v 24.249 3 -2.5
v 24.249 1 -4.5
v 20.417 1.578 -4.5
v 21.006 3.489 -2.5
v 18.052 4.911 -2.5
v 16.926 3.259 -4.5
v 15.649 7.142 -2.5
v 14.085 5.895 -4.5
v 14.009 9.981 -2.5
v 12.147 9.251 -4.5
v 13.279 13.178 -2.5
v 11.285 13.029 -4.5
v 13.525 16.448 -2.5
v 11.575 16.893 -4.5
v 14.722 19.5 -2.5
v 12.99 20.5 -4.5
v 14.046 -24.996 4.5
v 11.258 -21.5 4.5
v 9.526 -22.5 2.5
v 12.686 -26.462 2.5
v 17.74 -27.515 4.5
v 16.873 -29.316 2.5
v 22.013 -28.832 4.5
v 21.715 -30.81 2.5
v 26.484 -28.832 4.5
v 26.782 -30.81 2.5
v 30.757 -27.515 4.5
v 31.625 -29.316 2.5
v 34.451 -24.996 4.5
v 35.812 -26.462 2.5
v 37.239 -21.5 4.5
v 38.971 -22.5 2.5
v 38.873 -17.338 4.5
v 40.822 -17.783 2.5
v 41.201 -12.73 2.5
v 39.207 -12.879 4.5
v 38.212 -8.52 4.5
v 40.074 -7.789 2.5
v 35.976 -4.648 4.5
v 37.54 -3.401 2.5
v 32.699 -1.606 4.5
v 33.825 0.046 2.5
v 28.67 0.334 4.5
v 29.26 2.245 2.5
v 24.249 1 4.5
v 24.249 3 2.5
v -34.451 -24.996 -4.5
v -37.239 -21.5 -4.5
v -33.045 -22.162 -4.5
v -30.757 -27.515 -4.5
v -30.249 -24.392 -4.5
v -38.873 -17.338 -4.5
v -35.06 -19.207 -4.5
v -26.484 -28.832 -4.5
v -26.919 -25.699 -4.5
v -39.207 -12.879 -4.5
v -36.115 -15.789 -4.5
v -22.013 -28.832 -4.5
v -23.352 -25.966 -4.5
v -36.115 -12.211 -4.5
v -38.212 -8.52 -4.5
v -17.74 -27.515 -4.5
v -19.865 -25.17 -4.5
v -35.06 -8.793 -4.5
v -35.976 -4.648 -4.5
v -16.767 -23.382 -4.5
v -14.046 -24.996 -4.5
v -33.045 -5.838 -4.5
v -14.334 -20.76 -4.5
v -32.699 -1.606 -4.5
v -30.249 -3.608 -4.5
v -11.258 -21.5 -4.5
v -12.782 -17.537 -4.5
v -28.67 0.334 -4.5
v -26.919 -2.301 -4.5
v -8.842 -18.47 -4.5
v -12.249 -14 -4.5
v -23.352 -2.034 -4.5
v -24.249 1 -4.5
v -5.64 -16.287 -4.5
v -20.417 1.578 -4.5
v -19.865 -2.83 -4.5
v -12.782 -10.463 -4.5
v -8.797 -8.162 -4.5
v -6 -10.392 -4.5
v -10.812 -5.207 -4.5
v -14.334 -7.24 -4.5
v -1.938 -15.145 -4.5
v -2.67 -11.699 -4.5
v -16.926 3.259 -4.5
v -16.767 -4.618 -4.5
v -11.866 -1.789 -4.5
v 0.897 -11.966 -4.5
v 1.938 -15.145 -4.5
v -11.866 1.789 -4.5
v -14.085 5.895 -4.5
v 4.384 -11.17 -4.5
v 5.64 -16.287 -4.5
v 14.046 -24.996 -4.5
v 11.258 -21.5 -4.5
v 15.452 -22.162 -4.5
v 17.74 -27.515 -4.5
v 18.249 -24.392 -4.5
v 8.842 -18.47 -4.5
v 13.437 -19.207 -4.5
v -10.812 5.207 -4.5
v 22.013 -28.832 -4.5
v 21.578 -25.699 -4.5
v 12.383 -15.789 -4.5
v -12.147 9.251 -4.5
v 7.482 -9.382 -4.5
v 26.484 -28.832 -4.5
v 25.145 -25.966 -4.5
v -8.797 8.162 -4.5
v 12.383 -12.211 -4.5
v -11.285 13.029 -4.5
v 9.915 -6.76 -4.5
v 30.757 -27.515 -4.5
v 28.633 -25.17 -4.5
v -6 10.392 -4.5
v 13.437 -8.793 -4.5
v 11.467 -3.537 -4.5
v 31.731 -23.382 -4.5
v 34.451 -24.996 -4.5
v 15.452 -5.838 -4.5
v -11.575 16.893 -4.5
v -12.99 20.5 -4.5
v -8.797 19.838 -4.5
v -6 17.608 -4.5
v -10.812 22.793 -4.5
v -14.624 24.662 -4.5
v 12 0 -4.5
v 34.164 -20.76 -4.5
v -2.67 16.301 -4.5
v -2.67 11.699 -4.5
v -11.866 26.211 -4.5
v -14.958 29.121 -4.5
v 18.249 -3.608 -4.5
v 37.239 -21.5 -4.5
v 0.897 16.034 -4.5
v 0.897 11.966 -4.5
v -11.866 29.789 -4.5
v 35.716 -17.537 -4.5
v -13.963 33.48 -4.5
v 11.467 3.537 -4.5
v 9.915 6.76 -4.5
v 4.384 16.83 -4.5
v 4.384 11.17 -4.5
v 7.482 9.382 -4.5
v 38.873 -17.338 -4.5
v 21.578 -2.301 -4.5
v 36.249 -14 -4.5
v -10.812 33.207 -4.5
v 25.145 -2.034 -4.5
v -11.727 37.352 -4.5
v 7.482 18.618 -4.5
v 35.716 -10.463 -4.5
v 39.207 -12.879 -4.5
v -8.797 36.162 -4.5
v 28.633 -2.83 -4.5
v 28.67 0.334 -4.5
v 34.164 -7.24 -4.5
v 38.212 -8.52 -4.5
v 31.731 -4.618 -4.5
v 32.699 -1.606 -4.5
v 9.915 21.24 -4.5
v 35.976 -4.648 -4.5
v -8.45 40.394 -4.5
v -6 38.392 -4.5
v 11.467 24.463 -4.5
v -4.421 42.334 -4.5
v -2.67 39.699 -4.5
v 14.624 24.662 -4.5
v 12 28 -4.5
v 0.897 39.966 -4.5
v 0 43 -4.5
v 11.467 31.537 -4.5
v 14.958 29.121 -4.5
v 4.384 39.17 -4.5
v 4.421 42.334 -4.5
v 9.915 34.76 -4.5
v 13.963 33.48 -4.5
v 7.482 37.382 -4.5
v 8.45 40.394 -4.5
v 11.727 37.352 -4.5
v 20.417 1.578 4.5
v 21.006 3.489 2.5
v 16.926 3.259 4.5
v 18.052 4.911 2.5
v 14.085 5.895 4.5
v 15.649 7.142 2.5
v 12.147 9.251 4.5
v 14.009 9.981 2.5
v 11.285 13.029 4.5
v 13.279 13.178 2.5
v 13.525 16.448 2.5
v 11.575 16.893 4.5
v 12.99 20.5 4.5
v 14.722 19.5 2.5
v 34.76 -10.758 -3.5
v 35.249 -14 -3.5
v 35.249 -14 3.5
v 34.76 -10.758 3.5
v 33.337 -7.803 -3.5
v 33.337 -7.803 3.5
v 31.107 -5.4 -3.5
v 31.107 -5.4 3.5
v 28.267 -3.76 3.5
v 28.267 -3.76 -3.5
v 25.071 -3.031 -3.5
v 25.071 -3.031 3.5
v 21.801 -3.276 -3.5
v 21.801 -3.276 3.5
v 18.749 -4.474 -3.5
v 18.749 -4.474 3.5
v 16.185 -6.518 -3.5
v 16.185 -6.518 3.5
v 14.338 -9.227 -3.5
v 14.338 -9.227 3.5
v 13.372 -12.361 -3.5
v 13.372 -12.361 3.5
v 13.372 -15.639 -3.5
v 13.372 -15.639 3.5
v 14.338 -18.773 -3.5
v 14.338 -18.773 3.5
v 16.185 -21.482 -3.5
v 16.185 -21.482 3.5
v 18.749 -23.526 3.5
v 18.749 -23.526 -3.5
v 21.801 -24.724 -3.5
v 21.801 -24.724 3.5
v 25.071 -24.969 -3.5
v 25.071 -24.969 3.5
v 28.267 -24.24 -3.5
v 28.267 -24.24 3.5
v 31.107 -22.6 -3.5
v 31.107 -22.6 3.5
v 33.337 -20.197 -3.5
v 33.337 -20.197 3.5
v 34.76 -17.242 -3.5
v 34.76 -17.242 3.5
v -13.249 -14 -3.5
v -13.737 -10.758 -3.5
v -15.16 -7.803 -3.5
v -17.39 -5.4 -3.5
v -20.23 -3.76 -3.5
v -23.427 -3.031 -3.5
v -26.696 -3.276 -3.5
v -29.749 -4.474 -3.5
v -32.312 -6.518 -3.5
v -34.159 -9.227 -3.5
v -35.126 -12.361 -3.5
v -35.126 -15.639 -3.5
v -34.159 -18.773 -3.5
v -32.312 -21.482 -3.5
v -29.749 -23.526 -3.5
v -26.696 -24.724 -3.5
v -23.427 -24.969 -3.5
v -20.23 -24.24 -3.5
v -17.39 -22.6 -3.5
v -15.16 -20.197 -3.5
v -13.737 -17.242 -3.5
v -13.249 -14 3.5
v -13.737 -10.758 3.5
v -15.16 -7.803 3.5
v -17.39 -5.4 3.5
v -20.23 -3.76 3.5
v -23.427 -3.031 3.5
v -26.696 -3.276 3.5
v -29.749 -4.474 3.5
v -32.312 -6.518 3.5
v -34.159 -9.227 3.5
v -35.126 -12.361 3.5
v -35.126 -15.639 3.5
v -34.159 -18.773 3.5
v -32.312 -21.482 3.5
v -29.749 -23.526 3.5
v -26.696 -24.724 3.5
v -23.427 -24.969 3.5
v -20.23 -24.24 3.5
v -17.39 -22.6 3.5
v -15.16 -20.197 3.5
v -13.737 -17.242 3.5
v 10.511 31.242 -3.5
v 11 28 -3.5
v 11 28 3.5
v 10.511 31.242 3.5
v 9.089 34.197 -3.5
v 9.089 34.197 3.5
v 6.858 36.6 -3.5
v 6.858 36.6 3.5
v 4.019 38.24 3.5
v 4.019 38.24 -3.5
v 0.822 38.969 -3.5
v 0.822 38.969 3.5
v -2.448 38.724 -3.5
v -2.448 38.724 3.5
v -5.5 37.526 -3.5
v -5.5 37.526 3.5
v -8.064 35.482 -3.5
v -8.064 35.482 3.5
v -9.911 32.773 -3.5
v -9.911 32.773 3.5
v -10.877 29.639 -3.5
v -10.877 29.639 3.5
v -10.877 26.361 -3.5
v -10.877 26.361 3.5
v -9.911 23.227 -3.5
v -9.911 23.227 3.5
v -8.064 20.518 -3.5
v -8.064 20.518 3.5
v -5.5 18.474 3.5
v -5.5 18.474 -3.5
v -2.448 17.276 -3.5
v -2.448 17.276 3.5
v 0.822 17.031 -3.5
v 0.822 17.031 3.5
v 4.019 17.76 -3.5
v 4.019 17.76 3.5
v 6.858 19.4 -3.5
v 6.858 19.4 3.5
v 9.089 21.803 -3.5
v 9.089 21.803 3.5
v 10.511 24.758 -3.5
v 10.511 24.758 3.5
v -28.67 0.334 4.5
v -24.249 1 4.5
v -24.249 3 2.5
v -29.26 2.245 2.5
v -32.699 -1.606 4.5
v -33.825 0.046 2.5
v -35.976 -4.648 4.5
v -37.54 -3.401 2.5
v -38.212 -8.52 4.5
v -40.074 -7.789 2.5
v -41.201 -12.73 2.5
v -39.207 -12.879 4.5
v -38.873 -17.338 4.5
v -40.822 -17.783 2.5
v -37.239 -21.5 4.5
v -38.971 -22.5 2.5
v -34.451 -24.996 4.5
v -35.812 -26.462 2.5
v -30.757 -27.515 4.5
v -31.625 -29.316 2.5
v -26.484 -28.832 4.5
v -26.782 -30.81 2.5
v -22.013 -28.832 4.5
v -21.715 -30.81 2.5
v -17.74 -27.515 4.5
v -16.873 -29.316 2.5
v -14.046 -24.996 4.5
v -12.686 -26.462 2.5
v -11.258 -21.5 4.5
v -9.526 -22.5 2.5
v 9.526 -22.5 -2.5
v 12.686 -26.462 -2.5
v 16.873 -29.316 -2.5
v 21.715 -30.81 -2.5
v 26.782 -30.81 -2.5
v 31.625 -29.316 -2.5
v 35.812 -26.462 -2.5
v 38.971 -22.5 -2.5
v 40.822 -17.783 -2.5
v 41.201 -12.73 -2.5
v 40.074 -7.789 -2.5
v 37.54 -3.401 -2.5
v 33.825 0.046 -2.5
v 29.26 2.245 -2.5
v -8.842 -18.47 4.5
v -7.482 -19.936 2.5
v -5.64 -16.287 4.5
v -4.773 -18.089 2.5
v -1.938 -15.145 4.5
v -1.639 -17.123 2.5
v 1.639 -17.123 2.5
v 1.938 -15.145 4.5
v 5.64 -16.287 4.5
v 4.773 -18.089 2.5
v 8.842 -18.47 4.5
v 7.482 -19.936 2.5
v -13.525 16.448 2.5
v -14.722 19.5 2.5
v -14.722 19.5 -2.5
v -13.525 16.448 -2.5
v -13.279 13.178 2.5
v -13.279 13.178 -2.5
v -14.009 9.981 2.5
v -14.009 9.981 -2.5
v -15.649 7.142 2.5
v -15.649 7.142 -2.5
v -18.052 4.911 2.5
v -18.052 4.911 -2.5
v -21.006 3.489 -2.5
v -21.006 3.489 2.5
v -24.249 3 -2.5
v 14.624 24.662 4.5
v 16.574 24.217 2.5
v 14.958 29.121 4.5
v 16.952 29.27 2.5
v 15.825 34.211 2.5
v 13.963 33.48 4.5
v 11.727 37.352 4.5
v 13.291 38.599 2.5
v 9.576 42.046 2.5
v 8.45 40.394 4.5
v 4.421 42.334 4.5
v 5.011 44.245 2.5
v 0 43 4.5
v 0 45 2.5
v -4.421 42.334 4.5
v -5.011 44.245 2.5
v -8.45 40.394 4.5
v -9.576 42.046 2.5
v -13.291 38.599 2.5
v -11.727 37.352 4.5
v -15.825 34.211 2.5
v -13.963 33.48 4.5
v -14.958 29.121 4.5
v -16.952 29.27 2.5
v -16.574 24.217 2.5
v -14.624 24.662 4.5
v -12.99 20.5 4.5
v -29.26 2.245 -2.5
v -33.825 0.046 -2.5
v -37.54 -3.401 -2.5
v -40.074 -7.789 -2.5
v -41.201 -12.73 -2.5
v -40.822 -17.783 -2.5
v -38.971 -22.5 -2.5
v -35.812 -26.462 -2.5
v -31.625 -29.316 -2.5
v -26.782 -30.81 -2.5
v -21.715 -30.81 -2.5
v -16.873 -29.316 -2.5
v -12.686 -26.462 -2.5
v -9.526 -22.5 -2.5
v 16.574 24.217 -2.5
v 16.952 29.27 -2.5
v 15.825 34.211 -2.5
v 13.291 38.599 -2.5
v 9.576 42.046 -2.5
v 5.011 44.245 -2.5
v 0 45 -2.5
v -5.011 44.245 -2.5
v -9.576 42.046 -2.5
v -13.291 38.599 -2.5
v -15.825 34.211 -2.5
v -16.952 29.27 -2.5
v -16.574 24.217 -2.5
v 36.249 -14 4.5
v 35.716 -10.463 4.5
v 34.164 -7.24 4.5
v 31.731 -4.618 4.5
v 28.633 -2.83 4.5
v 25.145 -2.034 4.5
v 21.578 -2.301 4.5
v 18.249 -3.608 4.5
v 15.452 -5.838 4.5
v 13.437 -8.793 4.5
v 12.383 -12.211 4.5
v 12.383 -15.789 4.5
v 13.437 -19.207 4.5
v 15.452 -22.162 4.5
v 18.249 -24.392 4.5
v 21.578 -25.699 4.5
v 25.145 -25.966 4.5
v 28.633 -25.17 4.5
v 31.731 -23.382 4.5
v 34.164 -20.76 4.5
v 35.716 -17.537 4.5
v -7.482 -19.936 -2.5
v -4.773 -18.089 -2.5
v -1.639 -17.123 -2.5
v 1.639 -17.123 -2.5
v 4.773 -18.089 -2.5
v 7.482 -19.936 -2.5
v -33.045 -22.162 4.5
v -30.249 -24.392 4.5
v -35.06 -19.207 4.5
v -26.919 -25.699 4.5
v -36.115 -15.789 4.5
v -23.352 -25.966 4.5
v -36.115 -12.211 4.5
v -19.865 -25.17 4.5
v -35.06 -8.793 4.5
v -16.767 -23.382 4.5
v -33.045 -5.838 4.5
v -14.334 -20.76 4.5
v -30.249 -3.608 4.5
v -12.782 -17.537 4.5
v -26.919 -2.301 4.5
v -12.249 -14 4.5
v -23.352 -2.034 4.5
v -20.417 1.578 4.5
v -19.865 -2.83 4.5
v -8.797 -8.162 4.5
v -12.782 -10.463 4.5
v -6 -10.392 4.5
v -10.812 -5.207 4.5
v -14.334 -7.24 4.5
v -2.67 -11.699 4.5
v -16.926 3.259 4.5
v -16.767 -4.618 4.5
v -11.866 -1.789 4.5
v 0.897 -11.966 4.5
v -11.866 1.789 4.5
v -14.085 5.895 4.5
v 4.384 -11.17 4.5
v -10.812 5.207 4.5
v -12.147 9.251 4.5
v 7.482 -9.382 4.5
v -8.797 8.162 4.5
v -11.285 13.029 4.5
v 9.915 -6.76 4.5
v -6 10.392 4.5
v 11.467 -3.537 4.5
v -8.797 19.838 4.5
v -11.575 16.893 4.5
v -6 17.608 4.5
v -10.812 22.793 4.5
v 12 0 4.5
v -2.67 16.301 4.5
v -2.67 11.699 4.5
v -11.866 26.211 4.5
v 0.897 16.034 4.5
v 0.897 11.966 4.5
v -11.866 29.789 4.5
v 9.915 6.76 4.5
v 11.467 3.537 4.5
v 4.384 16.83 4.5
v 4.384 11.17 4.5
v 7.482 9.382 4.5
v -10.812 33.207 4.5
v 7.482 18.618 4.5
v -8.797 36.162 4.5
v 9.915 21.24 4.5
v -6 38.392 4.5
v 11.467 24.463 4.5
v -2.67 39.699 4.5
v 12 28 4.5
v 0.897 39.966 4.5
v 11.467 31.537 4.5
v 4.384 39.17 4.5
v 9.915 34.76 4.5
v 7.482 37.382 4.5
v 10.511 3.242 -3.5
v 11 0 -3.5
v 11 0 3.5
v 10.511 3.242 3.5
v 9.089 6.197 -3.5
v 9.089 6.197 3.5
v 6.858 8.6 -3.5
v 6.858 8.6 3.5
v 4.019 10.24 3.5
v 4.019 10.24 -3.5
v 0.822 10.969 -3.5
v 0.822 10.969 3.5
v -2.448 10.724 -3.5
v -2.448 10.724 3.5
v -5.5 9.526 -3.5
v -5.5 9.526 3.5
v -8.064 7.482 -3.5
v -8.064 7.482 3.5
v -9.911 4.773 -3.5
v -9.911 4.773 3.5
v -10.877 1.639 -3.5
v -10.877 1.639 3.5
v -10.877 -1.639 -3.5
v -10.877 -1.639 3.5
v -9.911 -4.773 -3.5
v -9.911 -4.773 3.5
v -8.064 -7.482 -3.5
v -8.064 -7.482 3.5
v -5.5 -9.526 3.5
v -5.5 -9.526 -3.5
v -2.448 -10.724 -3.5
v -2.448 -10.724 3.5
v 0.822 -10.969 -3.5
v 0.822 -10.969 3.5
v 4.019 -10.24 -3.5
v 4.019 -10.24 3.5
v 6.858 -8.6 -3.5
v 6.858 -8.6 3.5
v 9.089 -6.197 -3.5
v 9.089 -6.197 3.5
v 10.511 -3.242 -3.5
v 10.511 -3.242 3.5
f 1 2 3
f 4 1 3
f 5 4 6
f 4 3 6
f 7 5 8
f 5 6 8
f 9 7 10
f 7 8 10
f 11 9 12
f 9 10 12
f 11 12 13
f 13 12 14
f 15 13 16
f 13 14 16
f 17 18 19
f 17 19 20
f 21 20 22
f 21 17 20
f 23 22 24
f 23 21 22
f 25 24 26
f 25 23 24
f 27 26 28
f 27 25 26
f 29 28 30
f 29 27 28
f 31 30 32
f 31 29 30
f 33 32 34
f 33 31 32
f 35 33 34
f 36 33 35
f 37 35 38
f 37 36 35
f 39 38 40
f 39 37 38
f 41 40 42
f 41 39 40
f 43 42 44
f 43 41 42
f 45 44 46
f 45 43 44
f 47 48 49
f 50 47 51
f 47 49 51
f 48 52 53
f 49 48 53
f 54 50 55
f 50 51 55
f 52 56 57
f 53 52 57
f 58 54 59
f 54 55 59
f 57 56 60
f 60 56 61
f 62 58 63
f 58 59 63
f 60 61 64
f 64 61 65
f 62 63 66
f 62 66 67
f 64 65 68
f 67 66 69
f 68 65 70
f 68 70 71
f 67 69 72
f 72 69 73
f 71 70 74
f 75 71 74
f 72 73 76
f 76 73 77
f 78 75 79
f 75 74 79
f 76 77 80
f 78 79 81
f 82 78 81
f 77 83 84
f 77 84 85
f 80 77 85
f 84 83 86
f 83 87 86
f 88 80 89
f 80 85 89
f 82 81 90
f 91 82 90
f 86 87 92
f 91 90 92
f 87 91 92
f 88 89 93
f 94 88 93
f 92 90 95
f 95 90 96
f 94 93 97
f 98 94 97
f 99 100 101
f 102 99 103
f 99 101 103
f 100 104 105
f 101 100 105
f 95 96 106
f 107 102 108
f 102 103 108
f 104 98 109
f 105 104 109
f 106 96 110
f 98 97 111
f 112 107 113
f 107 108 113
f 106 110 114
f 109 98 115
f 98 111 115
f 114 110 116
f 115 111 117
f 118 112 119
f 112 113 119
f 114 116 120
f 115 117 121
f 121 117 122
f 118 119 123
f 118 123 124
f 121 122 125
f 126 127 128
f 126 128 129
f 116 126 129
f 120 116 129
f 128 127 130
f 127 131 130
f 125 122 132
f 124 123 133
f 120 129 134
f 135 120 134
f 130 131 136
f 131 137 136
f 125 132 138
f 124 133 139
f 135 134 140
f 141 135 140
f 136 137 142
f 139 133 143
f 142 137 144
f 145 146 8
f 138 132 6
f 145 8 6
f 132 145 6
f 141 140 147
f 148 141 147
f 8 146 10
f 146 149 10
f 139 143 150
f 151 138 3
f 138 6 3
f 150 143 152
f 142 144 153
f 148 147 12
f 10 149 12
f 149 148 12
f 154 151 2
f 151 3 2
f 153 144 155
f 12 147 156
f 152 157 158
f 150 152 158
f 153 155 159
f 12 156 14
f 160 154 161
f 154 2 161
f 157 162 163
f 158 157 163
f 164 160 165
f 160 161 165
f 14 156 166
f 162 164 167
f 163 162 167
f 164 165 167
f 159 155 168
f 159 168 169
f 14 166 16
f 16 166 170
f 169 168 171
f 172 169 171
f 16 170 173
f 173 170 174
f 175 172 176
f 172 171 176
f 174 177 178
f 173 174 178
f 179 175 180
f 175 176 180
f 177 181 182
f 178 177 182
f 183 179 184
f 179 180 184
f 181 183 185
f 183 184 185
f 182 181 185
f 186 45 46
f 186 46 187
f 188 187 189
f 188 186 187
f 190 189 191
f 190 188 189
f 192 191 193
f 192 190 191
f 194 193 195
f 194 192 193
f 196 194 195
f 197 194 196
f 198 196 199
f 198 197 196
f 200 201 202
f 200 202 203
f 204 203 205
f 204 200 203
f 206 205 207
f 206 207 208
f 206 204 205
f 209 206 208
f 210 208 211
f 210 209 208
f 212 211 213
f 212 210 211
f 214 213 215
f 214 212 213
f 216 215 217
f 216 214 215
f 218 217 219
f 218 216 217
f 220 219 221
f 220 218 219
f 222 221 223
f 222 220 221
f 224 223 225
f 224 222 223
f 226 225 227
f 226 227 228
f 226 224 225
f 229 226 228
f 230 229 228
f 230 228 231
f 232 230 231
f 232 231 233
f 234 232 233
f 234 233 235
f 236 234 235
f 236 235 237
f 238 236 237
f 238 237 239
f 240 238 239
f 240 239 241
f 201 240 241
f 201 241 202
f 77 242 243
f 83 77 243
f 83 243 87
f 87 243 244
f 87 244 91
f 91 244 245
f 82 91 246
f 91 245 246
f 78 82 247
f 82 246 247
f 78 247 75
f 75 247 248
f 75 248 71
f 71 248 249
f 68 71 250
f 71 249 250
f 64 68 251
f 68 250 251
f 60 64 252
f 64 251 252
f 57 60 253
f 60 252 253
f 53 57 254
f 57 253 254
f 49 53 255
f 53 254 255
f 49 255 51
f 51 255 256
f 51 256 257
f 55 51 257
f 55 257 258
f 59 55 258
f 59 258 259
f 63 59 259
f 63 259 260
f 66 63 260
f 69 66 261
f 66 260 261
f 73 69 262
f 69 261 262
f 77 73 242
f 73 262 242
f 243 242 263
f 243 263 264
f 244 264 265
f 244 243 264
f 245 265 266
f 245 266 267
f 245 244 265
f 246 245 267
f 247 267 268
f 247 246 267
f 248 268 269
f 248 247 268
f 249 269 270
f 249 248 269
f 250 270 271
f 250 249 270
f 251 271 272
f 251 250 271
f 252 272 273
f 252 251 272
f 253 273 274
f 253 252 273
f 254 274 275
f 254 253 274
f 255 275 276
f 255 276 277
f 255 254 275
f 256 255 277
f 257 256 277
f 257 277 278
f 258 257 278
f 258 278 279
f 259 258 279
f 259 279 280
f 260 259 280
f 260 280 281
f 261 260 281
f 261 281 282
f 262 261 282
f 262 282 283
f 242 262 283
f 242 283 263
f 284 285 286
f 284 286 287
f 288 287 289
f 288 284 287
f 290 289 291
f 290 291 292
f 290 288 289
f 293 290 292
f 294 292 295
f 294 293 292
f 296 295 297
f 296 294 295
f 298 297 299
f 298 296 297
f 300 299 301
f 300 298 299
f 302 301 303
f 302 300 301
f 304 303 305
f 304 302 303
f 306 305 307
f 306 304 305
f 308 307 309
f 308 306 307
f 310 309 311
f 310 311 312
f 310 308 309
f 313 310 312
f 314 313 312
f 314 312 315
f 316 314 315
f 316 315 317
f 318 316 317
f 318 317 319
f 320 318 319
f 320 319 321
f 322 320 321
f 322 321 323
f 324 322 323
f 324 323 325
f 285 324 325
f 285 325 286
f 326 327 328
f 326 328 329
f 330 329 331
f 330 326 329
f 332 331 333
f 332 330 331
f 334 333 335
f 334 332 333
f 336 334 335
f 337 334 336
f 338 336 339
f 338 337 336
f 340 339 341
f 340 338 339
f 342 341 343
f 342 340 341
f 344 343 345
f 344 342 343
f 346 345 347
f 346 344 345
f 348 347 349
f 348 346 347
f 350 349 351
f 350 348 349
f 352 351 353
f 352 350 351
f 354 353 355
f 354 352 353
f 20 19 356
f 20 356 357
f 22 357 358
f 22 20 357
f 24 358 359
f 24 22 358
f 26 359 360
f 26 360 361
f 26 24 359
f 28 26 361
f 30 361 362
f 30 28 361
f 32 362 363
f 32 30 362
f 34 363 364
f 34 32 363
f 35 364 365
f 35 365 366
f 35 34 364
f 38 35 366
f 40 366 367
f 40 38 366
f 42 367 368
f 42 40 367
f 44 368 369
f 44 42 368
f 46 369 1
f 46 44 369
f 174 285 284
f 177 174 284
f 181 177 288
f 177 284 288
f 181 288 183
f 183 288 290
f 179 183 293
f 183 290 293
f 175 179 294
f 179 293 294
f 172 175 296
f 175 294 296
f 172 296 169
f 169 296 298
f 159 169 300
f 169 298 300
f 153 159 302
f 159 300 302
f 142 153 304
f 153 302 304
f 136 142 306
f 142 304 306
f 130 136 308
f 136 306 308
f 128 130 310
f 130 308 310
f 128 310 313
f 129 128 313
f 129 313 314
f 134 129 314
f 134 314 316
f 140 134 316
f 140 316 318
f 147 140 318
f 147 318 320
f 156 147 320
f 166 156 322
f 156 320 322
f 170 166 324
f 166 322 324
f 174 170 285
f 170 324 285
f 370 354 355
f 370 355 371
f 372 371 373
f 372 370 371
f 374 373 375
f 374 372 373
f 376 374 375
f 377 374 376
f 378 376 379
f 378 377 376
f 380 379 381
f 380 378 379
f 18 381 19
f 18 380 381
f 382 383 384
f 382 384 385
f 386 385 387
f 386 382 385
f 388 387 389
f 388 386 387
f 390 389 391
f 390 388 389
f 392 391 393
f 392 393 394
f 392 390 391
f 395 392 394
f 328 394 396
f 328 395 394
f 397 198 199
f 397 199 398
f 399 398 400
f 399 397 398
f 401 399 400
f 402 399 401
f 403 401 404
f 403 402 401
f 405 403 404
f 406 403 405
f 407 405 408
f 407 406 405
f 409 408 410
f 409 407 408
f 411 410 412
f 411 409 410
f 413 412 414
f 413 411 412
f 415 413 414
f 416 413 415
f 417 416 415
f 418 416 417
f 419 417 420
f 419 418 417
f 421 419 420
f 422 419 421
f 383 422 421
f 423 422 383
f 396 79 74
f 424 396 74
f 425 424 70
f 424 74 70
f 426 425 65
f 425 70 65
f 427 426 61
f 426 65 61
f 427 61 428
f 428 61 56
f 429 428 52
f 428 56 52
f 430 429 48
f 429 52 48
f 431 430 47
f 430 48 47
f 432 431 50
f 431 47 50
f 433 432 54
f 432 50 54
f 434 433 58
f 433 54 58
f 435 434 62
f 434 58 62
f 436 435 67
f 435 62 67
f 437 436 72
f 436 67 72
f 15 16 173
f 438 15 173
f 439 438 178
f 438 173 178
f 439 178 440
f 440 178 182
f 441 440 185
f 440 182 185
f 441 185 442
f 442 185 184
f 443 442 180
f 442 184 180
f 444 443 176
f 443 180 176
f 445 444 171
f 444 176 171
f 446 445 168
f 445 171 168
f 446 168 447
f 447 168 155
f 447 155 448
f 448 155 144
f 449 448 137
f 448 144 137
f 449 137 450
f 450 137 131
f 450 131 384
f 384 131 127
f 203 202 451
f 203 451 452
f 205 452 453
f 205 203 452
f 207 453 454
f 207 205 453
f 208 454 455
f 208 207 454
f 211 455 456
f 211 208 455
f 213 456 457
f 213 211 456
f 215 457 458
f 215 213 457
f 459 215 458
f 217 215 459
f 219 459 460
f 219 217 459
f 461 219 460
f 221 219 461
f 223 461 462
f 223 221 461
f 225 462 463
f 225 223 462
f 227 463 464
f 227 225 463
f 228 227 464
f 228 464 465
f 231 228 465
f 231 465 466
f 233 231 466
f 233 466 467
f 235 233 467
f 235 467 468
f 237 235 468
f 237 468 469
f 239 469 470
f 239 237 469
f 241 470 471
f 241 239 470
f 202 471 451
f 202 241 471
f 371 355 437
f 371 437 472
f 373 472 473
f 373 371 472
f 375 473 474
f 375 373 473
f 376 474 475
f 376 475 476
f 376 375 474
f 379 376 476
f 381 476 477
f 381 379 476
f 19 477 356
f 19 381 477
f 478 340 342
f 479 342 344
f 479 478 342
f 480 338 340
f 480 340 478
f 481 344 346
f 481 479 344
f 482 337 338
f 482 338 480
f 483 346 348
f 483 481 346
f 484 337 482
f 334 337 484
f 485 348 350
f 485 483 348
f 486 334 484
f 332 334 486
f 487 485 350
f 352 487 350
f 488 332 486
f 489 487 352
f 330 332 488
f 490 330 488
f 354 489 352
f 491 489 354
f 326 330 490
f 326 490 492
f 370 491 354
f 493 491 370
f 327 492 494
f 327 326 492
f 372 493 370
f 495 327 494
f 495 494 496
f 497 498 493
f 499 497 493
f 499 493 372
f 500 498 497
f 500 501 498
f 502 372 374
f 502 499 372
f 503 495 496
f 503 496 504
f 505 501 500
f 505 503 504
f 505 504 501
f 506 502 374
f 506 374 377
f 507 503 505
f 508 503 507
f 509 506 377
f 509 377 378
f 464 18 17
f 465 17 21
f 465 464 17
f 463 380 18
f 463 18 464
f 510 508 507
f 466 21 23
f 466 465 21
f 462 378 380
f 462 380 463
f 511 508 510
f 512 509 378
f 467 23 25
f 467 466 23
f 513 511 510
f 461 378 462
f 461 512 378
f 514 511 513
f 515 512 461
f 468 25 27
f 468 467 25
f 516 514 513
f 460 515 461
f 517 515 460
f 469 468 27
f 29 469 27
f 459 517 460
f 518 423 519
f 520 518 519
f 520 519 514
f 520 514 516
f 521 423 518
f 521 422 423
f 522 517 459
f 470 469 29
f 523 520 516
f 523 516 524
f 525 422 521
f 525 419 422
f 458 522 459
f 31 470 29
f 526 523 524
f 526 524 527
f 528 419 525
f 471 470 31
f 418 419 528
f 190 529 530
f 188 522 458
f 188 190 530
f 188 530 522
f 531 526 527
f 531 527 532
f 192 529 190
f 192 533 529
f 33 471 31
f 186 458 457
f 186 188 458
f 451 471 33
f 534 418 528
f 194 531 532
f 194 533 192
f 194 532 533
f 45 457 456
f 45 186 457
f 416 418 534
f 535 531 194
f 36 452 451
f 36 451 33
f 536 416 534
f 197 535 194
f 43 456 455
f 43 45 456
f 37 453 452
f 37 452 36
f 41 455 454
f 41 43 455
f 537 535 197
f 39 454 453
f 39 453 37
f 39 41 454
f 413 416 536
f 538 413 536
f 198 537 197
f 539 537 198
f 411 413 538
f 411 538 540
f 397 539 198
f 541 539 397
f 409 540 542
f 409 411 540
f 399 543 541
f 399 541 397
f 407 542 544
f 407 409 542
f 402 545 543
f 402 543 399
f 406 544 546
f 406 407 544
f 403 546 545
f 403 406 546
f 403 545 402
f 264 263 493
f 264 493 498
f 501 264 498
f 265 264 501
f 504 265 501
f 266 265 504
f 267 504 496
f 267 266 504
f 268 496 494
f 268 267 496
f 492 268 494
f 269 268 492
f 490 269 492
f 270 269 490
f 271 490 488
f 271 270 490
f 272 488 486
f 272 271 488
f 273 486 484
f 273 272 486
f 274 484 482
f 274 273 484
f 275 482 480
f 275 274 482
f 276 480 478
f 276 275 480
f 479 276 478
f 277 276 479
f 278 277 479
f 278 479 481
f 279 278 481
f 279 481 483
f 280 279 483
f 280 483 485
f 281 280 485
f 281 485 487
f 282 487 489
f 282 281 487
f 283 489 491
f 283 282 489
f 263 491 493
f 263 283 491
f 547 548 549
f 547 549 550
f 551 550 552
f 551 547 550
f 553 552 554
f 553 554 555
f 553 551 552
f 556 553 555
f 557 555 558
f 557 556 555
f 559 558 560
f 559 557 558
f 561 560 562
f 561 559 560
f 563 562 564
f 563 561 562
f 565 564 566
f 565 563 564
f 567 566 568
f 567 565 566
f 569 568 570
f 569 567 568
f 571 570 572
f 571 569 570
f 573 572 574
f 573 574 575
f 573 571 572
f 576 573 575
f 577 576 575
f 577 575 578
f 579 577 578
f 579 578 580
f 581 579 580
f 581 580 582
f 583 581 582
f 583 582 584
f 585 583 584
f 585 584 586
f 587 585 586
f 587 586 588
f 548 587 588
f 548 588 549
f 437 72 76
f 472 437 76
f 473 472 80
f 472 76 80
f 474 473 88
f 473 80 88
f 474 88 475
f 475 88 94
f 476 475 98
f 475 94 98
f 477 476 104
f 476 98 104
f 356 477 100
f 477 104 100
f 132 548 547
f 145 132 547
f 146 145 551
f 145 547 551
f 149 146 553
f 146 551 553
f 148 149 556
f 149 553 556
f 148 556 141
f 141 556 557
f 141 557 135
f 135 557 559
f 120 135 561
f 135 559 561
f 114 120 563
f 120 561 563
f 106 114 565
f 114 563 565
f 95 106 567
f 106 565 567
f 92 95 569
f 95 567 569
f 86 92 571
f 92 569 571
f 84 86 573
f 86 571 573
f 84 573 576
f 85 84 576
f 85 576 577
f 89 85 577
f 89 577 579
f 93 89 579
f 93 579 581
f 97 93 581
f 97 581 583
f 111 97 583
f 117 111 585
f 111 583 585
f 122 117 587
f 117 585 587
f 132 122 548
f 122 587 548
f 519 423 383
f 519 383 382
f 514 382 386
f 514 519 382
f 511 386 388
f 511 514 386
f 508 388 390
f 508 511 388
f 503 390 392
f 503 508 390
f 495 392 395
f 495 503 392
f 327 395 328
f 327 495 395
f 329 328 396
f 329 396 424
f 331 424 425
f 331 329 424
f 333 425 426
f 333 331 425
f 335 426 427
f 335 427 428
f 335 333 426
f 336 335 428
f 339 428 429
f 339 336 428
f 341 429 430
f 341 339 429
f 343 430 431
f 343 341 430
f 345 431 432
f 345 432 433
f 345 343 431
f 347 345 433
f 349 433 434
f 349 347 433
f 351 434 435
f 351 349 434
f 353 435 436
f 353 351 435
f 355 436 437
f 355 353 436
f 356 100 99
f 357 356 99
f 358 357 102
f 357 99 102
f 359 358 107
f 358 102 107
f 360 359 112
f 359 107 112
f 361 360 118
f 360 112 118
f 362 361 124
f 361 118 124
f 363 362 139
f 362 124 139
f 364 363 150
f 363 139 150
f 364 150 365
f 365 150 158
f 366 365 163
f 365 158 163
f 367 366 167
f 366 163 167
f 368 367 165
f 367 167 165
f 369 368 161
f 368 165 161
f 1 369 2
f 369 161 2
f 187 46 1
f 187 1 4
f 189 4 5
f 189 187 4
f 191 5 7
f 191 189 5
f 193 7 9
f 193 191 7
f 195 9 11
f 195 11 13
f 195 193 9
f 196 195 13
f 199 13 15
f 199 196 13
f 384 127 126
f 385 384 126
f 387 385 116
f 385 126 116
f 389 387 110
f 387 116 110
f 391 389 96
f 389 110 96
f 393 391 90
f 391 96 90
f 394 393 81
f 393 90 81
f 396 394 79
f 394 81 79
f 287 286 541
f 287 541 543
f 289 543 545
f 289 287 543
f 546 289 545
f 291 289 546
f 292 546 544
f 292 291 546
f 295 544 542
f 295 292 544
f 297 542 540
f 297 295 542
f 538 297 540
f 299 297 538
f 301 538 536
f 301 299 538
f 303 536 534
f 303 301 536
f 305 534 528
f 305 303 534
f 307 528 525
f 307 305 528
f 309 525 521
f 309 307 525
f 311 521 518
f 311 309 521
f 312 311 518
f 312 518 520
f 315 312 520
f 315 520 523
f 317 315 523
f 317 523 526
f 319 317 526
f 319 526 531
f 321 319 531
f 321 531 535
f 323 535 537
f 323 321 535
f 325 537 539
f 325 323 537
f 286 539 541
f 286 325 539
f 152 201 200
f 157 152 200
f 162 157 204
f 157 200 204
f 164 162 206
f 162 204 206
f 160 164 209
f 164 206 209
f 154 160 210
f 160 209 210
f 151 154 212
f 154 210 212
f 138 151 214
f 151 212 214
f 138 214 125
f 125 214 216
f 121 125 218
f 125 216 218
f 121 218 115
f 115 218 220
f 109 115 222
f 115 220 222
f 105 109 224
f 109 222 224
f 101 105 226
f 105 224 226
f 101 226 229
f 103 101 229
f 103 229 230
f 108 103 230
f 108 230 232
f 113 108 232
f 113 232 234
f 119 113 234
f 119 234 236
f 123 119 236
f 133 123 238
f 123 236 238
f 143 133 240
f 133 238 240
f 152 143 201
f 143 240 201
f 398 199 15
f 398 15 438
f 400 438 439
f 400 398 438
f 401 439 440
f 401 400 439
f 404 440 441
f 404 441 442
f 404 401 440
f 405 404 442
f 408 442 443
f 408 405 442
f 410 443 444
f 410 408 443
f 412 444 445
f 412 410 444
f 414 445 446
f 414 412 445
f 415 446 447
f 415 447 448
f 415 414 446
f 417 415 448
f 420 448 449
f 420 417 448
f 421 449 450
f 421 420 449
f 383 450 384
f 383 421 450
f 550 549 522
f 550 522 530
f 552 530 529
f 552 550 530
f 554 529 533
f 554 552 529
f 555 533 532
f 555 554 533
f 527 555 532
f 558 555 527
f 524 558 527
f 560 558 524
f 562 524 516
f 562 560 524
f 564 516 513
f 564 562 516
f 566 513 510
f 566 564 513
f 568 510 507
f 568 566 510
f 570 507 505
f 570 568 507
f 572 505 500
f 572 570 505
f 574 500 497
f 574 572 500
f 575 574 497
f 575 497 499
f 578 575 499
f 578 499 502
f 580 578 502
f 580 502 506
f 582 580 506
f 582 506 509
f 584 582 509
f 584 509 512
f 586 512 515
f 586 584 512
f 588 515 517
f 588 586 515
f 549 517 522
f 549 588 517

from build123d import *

# Parameters (mm, degrees)
F0_R     = 11
F1_DEPTH = 4.5
F4_SIZE  = 2
F5_SIZE  = 1


# Not quite as in the source:
# - a feature of the source that left no trace in its solid (it failed there, or was rolled back) is left out


with BuildPart() as f1:
    # F0 (on Top) → F1 (new body, symmetric)
    with BuildSketch(Plane.XY):
        with BuildLine():
            ThreePointArc((-24.248711306, 3), (-38.9711431703, -22.5), (-9.5262794416, -22.5))
            ThreePointArc((-9.5262794416, -22.5), (0, -17), (9.5262794416, -22.5))
            ThreePointArc((9.5262794416, -22.5), (38.9711431703, -22.5), (24.248711306, 3))
            ThreePointArc((24.248711306, 3), (14.7224318643, 8.5), (14.7224318643, 19.5))
            ThreePointArc((14.7224318643, 19.5), (0, 45), (-14.7224318643, 19.5))
            ThreePointArc((-14.7224318643, 19.5), (-14.7224318643, 8.5), (-24.248711306, 3))
        make_face()
        with Locations((-24.248711306, -14)):
            Circle(F0_R, mode=Mode.SUBTRACT)
        with Locations((24.248711306, -14)):
            Circle(F0_R, mode=Mode.SUBTRACT)
        Circle(F0_R, mode=Mode.SUBTRACT)
        with Locations((0, 28)):
            Circle(F0_R, mode=Mode.SUBTRACT)
    extrude(amount=F1_DEPTH, both=True)

    # F4
    f4_edges = [f1.edges().sort_by_distance(p)[0] for p in [
        (-38.971143, -22.5, 4.5),
        (-38.971143, -22.5, -4.5),
        (-14.722432, 8.5, -4.5),
        (-14.722432, 8.5, 4.5),
        (0, 45, -4.5),
        (0, 45, 4.5),
        (14.722432, 8.5, -4.5),
        (14.722432, 8.5, 4.5),
        (38.971143, -22.5, -4.5),
        (38.971143, -22.5, 4.5),
        (0, -17, -4.5),
        (0, -17, 4.5),
    ]]
    chamfer(f4_edges, length=F4_SIZE)

    # F5
    f5_edges = [f1.edges().sort_by_distance(p)[0] for p in [
        (-35.248711, -14, 4.5),
        (-13.248711, -14, 0),
        (-35.248711, -14, -4.5),
        (-11, 0, 4.5),
        (11, 0, 0),
        (-11, 0, -4.5),
        (-11, 28, 4.5),
        (11, 28, 0),
        (-11, 28, -4.5),
        (13.248711, -14, 4.5),
        (35.248711, -14, 0),
        (13.248711, -14, -4.5),
    ]]
    chamfer(f5_edges, length=F5_SIZE)


solid = f1.part
